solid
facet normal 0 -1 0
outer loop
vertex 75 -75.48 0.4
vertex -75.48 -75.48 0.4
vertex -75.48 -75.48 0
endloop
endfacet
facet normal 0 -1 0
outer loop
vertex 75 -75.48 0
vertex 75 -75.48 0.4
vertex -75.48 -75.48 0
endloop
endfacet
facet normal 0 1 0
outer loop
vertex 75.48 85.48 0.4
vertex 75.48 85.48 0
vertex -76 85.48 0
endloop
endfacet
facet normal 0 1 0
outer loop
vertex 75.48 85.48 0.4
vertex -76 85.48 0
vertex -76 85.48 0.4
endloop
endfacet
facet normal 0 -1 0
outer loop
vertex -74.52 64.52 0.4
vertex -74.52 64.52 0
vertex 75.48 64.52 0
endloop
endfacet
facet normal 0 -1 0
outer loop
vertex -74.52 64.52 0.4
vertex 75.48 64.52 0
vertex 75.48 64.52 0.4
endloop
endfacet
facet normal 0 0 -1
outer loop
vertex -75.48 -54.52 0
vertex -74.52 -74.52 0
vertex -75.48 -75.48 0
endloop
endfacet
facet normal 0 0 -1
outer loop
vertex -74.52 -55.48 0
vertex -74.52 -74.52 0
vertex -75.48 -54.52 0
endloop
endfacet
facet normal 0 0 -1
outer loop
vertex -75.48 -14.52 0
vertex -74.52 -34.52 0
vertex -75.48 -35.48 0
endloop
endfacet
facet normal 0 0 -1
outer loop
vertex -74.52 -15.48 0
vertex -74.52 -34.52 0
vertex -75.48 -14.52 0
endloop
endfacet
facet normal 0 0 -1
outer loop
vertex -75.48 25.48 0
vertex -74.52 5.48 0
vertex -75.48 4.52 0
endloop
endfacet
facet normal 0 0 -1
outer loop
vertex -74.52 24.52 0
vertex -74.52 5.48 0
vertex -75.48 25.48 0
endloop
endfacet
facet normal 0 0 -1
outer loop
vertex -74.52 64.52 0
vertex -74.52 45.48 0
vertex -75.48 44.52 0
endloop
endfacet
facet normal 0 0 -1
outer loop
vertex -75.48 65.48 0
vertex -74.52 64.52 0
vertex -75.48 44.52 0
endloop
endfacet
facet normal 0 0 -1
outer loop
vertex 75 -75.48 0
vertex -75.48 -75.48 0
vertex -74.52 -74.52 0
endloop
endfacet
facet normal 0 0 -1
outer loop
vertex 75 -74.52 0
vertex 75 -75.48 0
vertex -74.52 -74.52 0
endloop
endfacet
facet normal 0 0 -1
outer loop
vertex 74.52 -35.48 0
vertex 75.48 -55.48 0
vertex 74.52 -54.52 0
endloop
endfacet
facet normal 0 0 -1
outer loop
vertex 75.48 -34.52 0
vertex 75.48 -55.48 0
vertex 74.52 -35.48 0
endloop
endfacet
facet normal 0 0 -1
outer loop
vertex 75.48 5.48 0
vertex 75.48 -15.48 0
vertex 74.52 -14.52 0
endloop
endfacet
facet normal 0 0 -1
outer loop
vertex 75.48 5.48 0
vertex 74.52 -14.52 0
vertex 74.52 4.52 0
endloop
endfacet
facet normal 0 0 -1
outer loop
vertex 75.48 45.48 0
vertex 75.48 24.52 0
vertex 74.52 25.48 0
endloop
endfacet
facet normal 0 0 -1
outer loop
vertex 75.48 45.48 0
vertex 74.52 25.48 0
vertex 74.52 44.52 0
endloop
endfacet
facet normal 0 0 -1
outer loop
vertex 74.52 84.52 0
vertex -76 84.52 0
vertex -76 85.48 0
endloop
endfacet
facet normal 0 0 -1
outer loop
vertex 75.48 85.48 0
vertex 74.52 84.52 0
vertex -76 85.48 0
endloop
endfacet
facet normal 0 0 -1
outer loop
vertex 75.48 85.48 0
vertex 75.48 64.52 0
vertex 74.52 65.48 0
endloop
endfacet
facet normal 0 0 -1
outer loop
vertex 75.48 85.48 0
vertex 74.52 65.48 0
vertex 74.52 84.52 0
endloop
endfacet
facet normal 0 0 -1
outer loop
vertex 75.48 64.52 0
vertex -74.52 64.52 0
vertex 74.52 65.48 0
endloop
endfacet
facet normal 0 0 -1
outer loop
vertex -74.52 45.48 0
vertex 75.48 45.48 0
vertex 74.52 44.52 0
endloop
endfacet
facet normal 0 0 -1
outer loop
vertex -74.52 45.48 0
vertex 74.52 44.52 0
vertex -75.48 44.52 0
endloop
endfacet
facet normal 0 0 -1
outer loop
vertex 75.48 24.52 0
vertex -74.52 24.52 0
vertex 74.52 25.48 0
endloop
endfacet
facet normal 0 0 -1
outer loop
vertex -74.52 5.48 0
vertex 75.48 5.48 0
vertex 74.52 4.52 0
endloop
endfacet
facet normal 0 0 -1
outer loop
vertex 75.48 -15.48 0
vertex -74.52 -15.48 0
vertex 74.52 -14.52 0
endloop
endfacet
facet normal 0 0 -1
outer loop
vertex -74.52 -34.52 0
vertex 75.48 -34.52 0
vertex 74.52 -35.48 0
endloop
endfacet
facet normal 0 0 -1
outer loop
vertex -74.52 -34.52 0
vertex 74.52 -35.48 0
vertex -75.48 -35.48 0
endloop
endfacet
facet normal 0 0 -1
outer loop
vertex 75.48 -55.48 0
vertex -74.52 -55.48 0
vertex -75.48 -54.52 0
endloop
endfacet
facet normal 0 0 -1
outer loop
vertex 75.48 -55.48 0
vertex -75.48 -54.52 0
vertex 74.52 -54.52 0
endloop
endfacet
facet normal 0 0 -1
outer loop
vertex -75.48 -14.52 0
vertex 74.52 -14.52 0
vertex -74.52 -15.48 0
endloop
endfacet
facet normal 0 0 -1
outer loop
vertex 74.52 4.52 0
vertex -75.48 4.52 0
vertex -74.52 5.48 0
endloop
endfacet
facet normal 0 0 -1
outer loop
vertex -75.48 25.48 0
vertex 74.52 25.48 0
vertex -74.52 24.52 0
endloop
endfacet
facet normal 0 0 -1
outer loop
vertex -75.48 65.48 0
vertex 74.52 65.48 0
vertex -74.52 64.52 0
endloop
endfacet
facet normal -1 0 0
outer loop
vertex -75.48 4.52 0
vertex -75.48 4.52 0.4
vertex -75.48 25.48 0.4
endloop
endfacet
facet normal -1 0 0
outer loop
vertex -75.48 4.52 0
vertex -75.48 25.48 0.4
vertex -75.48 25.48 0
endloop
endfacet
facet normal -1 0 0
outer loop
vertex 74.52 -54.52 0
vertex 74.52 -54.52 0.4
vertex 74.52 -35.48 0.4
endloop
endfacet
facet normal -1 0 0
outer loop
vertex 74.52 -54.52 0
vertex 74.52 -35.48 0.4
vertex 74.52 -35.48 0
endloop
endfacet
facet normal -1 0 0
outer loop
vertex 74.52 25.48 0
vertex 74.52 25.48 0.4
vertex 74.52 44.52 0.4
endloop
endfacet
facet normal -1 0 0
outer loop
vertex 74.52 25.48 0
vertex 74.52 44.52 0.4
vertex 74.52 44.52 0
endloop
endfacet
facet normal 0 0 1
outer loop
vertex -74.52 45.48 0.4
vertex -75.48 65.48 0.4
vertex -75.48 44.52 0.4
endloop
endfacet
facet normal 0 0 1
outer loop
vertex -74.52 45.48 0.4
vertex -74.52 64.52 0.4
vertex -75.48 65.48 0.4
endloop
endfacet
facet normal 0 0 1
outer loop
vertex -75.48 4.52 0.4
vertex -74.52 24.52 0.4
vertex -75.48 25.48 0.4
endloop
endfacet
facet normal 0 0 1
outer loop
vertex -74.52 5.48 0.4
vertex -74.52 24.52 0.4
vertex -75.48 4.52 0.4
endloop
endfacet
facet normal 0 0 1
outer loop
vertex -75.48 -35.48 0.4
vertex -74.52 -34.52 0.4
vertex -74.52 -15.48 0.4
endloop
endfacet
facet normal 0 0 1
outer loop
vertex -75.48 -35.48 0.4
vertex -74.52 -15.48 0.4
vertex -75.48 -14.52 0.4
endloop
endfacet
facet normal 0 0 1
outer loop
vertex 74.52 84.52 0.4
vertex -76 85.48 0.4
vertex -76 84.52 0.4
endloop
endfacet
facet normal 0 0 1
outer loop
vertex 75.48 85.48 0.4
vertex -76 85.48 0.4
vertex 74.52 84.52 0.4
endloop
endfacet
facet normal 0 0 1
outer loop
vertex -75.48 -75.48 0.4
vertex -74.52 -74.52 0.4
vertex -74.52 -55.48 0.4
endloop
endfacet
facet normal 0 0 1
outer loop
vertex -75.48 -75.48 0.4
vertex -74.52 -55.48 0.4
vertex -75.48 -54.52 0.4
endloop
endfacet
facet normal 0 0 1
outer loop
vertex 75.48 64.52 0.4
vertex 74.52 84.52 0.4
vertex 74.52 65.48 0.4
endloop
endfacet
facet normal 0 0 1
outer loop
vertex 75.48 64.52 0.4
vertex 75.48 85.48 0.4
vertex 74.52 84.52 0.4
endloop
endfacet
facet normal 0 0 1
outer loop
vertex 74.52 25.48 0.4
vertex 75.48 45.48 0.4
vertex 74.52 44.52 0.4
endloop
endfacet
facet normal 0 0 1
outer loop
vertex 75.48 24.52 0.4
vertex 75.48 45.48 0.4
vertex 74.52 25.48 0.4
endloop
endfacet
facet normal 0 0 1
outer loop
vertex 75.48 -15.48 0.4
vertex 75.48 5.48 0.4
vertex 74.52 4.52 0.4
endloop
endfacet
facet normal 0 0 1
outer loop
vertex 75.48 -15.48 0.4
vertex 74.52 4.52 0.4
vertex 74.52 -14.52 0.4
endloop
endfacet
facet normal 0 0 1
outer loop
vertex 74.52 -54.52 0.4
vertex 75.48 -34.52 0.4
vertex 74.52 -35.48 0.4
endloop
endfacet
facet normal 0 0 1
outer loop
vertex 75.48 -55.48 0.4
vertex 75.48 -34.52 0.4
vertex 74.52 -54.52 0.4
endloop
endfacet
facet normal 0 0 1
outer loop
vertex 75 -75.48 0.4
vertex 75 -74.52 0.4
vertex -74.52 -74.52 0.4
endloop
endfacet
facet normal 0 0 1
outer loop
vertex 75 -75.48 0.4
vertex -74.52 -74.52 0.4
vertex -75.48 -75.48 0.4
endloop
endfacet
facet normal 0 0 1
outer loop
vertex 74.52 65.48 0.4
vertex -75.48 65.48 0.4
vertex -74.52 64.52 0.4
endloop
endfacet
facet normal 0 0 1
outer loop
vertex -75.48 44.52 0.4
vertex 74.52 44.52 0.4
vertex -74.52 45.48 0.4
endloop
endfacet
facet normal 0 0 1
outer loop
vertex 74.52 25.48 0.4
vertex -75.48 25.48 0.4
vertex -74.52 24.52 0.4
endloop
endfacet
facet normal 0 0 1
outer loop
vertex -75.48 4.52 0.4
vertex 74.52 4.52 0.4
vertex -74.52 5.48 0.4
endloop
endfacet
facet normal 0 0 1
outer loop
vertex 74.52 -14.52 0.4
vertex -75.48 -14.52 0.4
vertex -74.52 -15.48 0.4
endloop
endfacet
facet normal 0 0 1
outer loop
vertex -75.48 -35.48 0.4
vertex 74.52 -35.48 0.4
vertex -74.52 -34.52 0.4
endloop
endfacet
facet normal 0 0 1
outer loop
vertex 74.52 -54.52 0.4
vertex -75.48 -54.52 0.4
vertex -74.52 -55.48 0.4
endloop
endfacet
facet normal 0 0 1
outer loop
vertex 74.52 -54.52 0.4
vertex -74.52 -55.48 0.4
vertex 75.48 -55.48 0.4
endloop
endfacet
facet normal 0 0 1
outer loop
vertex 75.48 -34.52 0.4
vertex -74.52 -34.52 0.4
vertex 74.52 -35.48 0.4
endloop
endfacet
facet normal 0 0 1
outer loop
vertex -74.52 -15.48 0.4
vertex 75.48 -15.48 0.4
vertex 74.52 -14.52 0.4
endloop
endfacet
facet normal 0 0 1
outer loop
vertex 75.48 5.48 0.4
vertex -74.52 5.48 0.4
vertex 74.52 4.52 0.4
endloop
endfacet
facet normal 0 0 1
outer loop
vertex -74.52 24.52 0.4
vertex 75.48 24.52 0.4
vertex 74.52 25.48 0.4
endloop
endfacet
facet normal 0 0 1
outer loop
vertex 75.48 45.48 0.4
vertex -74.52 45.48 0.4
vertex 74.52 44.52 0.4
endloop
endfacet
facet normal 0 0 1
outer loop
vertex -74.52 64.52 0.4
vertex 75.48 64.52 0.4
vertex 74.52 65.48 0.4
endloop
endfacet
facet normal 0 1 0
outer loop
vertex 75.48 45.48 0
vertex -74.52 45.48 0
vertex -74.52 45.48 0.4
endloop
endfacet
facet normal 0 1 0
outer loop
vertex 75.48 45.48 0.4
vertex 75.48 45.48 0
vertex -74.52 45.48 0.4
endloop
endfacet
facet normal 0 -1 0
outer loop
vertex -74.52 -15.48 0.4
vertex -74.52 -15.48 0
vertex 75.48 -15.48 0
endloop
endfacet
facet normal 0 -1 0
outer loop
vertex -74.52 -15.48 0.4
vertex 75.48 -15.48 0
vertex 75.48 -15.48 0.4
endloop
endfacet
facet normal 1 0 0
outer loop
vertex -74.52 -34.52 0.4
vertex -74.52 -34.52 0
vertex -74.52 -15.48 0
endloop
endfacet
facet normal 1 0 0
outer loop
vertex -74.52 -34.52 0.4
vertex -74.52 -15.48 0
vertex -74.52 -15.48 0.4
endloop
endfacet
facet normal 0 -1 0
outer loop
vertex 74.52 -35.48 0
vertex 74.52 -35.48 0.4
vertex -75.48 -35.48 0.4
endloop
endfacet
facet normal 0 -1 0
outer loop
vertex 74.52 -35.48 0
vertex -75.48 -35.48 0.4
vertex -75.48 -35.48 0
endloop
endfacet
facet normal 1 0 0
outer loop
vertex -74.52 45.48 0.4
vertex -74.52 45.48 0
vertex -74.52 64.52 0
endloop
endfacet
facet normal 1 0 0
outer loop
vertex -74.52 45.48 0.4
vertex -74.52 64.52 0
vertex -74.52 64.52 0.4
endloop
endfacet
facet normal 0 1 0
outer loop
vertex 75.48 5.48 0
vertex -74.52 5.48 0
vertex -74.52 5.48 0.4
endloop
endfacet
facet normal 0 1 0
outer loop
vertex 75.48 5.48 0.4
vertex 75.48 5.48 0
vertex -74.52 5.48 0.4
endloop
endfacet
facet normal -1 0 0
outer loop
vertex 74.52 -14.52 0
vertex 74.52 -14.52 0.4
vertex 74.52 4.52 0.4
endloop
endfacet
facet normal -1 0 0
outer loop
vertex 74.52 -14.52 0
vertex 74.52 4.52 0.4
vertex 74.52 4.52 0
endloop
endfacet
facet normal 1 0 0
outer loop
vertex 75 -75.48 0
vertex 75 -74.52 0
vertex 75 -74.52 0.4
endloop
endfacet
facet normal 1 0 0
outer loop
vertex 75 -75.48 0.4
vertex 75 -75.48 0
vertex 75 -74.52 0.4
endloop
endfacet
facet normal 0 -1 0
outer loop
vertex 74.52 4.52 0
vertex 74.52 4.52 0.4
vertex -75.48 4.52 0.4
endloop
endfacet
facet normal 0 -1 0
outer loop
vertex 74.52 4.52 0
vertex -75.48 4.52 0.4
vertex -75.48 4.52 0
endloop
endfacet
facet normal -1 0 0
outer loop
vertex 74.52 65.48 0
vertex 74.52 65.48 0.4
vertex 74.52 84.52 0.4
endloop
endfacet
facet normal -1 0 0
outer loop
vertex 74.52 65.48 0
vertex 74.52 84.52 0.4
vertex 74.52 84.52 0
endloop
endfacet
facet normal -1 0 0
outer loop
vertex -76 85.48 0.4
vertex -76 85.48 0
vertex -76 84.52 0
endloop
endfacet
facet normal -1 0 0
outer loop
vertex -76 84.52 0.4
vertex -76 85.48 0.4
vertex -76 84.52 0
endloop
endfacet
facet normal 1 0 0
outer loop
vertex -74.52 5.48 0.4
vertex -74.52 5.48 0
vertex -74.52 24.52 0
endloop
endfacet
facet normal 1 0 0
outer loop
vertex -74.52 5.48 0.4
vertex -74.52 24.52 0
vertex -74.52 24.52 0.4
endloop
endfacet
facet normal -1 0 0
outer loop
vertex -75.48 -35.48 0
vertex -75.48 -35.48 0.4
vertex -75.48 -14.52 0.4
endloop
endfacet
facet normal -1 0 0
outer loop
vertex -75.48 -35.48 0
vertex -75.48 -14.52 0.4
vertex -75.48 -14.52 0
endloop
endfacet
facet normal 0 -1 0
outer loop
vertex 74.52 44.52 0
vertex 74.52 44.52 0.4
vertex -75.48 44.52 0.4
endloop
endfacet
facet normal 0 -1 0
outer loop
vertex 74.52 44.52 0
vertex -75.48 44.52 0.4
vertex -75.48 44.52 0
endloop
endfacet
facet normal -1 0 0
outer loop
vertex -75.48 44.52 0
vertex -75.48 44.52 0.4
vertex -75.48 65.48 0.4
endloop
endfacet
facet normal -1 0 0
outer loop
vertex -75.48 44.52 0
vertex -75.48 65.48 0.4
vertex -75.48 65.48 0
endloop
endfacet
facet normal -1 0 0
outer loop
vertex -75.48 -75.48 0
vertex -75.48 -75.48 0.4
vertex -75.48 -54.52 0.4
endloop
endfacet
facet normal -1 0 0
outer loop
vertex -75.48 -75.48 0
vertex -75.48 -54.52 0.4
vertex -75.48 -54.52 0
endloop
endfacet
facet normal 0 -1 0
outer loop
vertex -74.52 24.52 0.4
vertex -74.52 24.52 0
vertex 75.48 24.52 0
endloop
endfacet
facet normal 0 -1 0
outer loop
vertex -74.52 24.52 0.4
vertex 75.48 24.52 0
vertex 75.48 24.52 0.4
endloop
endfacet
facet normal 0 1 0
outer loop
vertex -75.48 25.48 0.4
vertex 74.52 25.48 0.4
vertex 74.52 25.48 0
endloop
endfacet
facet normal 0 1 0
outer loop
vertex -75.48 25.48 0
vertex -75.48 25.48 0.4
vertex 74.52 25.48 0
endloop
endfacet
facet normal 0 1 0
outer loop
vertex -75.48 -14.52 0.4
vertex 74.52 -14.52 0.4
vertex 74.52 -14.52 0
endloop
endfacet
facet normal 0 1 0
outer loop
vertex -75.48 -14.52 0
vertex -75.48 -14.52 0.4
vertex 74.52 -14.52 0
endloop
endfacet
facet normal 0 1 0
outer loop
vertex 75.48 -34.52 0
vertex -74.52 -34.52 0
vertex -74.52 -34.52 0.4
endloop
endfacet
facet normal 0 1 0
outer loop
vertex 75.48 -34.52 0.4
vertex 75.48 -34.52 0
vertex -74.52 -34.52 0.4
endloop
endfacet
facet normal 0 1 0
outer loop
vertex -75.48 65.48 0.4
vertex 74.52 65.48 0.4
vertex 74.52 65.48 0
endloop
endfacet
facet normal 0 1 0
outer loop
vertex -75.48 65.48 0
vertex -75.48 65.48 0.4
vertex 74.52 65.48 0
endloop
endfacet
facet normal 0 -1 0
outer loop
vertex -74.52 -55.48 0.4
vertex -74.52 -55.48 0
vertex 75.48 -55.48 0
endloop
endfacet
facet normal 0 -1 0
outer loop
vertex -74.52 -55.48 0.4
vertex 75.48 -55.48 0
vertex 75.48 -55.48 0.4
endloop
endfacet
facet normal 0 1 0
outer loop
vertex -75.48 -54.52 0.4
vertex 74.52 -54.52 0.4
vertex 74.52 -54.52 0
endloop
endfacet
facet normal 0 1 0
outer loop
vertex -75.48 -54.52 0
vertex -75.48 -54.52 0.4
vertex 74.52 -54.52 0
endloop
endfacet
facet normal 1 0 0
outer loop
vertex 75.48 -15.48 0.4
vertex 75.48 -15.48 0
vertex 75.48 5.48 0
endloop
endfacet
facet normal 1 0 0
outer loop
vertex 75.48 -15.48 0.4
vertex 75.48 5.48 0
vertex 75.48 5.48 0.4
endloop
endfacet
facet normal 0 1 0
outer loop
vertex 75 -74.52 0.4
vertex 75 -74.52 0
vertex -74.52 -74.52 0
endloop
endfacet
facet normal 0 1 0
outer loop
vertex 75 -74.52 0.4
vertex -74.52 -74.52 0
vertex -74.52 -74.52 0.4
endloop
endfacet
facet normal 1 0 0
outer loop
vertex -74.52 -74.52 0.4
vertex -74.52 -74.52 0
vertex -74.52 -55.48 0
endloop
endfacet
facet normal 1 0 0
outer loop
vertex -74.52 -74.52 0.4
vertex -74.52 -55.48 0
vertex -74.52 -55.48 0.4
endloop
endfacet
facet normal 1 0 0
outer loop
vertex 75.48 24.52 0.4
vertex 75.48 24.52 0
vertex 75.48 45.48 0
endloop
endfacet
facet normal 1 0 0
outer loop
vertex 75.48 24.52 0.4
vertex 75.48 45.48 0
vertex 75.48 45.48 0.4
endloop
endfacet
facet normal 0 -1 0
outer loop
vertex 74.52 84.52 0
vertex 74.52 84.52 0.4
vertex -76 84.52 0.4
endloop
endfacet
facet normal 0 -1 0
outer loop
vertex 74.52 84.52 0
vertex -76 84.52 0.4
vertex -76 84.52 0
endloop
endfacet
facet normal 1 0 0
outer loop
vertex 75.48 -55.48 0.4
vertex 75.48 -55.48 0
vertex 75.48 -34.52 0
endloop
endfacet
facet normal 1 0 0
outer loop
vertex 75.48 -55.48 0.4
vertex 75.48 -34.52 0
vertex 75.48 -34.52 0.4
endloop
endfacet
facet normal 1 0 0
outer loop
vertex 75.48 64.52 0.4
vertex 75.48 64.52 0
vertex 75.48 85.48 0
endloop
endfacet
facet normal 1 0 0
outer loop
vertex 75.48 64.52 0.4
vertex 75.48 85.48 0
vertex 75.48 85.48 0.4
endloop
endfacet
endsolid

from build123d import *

# Parameters (mm, degrees)
F2_DEPTH  = 0.4
F2_FACE_W = 0.96
F2_FACE_H = 0.4


with BuildPart() as f2:
    # F1 (on Top) → F2 (new body)
    with BuildSketch(Plane.XY):
        Polygon((-75, 84.52), (-75, 85), (-75, 85.48), (-76, 85.48), (-76, 84.52), align=None)
    extrude(amount=F2_DEPTH)

    # F3: sweep along a path in F1
    with BuildLine(Plane.XY) as f3_path:
        Line((-75, 85), (75, 85))
        Line((75, 85), (75, 65))
        Line((75, 65), (-75, 65))
        Line((-75, 65), (-75, 45))
        Line((-75, 45), (75, 45))
        Line((75, 45), (75, 25))
        Line((75, 25), (-75, 25))
        Line((-75, 25), (-75, 5))
        Line((-75, 5), (75, 5))
        Line((75, 5), (75, -15))
        Line((75, -15), (-75, -15))
        Line((-75, -15), (-75, -35))
        Line((-75, -35), (75, -35))
        Line((75, -35), (75, -55))
        Line((75, -55), (-75, -55))
        Line((-75, -55), (-75, -75))
        Line((-75, -75), (75, -75))
    # F2_face (on face) → F3 (sweep)
    with BuildSketch(Plane(origin=(-75, 85, 0.2), x_dir=(0, 1, 0), z_dir=(1, 0, 0))):
        Rectangle(F2_FACE_W, F2_FACE_H)
    sweep(path=f3_path.line, transition=Transition.RIGHT)


solid = f2.part
